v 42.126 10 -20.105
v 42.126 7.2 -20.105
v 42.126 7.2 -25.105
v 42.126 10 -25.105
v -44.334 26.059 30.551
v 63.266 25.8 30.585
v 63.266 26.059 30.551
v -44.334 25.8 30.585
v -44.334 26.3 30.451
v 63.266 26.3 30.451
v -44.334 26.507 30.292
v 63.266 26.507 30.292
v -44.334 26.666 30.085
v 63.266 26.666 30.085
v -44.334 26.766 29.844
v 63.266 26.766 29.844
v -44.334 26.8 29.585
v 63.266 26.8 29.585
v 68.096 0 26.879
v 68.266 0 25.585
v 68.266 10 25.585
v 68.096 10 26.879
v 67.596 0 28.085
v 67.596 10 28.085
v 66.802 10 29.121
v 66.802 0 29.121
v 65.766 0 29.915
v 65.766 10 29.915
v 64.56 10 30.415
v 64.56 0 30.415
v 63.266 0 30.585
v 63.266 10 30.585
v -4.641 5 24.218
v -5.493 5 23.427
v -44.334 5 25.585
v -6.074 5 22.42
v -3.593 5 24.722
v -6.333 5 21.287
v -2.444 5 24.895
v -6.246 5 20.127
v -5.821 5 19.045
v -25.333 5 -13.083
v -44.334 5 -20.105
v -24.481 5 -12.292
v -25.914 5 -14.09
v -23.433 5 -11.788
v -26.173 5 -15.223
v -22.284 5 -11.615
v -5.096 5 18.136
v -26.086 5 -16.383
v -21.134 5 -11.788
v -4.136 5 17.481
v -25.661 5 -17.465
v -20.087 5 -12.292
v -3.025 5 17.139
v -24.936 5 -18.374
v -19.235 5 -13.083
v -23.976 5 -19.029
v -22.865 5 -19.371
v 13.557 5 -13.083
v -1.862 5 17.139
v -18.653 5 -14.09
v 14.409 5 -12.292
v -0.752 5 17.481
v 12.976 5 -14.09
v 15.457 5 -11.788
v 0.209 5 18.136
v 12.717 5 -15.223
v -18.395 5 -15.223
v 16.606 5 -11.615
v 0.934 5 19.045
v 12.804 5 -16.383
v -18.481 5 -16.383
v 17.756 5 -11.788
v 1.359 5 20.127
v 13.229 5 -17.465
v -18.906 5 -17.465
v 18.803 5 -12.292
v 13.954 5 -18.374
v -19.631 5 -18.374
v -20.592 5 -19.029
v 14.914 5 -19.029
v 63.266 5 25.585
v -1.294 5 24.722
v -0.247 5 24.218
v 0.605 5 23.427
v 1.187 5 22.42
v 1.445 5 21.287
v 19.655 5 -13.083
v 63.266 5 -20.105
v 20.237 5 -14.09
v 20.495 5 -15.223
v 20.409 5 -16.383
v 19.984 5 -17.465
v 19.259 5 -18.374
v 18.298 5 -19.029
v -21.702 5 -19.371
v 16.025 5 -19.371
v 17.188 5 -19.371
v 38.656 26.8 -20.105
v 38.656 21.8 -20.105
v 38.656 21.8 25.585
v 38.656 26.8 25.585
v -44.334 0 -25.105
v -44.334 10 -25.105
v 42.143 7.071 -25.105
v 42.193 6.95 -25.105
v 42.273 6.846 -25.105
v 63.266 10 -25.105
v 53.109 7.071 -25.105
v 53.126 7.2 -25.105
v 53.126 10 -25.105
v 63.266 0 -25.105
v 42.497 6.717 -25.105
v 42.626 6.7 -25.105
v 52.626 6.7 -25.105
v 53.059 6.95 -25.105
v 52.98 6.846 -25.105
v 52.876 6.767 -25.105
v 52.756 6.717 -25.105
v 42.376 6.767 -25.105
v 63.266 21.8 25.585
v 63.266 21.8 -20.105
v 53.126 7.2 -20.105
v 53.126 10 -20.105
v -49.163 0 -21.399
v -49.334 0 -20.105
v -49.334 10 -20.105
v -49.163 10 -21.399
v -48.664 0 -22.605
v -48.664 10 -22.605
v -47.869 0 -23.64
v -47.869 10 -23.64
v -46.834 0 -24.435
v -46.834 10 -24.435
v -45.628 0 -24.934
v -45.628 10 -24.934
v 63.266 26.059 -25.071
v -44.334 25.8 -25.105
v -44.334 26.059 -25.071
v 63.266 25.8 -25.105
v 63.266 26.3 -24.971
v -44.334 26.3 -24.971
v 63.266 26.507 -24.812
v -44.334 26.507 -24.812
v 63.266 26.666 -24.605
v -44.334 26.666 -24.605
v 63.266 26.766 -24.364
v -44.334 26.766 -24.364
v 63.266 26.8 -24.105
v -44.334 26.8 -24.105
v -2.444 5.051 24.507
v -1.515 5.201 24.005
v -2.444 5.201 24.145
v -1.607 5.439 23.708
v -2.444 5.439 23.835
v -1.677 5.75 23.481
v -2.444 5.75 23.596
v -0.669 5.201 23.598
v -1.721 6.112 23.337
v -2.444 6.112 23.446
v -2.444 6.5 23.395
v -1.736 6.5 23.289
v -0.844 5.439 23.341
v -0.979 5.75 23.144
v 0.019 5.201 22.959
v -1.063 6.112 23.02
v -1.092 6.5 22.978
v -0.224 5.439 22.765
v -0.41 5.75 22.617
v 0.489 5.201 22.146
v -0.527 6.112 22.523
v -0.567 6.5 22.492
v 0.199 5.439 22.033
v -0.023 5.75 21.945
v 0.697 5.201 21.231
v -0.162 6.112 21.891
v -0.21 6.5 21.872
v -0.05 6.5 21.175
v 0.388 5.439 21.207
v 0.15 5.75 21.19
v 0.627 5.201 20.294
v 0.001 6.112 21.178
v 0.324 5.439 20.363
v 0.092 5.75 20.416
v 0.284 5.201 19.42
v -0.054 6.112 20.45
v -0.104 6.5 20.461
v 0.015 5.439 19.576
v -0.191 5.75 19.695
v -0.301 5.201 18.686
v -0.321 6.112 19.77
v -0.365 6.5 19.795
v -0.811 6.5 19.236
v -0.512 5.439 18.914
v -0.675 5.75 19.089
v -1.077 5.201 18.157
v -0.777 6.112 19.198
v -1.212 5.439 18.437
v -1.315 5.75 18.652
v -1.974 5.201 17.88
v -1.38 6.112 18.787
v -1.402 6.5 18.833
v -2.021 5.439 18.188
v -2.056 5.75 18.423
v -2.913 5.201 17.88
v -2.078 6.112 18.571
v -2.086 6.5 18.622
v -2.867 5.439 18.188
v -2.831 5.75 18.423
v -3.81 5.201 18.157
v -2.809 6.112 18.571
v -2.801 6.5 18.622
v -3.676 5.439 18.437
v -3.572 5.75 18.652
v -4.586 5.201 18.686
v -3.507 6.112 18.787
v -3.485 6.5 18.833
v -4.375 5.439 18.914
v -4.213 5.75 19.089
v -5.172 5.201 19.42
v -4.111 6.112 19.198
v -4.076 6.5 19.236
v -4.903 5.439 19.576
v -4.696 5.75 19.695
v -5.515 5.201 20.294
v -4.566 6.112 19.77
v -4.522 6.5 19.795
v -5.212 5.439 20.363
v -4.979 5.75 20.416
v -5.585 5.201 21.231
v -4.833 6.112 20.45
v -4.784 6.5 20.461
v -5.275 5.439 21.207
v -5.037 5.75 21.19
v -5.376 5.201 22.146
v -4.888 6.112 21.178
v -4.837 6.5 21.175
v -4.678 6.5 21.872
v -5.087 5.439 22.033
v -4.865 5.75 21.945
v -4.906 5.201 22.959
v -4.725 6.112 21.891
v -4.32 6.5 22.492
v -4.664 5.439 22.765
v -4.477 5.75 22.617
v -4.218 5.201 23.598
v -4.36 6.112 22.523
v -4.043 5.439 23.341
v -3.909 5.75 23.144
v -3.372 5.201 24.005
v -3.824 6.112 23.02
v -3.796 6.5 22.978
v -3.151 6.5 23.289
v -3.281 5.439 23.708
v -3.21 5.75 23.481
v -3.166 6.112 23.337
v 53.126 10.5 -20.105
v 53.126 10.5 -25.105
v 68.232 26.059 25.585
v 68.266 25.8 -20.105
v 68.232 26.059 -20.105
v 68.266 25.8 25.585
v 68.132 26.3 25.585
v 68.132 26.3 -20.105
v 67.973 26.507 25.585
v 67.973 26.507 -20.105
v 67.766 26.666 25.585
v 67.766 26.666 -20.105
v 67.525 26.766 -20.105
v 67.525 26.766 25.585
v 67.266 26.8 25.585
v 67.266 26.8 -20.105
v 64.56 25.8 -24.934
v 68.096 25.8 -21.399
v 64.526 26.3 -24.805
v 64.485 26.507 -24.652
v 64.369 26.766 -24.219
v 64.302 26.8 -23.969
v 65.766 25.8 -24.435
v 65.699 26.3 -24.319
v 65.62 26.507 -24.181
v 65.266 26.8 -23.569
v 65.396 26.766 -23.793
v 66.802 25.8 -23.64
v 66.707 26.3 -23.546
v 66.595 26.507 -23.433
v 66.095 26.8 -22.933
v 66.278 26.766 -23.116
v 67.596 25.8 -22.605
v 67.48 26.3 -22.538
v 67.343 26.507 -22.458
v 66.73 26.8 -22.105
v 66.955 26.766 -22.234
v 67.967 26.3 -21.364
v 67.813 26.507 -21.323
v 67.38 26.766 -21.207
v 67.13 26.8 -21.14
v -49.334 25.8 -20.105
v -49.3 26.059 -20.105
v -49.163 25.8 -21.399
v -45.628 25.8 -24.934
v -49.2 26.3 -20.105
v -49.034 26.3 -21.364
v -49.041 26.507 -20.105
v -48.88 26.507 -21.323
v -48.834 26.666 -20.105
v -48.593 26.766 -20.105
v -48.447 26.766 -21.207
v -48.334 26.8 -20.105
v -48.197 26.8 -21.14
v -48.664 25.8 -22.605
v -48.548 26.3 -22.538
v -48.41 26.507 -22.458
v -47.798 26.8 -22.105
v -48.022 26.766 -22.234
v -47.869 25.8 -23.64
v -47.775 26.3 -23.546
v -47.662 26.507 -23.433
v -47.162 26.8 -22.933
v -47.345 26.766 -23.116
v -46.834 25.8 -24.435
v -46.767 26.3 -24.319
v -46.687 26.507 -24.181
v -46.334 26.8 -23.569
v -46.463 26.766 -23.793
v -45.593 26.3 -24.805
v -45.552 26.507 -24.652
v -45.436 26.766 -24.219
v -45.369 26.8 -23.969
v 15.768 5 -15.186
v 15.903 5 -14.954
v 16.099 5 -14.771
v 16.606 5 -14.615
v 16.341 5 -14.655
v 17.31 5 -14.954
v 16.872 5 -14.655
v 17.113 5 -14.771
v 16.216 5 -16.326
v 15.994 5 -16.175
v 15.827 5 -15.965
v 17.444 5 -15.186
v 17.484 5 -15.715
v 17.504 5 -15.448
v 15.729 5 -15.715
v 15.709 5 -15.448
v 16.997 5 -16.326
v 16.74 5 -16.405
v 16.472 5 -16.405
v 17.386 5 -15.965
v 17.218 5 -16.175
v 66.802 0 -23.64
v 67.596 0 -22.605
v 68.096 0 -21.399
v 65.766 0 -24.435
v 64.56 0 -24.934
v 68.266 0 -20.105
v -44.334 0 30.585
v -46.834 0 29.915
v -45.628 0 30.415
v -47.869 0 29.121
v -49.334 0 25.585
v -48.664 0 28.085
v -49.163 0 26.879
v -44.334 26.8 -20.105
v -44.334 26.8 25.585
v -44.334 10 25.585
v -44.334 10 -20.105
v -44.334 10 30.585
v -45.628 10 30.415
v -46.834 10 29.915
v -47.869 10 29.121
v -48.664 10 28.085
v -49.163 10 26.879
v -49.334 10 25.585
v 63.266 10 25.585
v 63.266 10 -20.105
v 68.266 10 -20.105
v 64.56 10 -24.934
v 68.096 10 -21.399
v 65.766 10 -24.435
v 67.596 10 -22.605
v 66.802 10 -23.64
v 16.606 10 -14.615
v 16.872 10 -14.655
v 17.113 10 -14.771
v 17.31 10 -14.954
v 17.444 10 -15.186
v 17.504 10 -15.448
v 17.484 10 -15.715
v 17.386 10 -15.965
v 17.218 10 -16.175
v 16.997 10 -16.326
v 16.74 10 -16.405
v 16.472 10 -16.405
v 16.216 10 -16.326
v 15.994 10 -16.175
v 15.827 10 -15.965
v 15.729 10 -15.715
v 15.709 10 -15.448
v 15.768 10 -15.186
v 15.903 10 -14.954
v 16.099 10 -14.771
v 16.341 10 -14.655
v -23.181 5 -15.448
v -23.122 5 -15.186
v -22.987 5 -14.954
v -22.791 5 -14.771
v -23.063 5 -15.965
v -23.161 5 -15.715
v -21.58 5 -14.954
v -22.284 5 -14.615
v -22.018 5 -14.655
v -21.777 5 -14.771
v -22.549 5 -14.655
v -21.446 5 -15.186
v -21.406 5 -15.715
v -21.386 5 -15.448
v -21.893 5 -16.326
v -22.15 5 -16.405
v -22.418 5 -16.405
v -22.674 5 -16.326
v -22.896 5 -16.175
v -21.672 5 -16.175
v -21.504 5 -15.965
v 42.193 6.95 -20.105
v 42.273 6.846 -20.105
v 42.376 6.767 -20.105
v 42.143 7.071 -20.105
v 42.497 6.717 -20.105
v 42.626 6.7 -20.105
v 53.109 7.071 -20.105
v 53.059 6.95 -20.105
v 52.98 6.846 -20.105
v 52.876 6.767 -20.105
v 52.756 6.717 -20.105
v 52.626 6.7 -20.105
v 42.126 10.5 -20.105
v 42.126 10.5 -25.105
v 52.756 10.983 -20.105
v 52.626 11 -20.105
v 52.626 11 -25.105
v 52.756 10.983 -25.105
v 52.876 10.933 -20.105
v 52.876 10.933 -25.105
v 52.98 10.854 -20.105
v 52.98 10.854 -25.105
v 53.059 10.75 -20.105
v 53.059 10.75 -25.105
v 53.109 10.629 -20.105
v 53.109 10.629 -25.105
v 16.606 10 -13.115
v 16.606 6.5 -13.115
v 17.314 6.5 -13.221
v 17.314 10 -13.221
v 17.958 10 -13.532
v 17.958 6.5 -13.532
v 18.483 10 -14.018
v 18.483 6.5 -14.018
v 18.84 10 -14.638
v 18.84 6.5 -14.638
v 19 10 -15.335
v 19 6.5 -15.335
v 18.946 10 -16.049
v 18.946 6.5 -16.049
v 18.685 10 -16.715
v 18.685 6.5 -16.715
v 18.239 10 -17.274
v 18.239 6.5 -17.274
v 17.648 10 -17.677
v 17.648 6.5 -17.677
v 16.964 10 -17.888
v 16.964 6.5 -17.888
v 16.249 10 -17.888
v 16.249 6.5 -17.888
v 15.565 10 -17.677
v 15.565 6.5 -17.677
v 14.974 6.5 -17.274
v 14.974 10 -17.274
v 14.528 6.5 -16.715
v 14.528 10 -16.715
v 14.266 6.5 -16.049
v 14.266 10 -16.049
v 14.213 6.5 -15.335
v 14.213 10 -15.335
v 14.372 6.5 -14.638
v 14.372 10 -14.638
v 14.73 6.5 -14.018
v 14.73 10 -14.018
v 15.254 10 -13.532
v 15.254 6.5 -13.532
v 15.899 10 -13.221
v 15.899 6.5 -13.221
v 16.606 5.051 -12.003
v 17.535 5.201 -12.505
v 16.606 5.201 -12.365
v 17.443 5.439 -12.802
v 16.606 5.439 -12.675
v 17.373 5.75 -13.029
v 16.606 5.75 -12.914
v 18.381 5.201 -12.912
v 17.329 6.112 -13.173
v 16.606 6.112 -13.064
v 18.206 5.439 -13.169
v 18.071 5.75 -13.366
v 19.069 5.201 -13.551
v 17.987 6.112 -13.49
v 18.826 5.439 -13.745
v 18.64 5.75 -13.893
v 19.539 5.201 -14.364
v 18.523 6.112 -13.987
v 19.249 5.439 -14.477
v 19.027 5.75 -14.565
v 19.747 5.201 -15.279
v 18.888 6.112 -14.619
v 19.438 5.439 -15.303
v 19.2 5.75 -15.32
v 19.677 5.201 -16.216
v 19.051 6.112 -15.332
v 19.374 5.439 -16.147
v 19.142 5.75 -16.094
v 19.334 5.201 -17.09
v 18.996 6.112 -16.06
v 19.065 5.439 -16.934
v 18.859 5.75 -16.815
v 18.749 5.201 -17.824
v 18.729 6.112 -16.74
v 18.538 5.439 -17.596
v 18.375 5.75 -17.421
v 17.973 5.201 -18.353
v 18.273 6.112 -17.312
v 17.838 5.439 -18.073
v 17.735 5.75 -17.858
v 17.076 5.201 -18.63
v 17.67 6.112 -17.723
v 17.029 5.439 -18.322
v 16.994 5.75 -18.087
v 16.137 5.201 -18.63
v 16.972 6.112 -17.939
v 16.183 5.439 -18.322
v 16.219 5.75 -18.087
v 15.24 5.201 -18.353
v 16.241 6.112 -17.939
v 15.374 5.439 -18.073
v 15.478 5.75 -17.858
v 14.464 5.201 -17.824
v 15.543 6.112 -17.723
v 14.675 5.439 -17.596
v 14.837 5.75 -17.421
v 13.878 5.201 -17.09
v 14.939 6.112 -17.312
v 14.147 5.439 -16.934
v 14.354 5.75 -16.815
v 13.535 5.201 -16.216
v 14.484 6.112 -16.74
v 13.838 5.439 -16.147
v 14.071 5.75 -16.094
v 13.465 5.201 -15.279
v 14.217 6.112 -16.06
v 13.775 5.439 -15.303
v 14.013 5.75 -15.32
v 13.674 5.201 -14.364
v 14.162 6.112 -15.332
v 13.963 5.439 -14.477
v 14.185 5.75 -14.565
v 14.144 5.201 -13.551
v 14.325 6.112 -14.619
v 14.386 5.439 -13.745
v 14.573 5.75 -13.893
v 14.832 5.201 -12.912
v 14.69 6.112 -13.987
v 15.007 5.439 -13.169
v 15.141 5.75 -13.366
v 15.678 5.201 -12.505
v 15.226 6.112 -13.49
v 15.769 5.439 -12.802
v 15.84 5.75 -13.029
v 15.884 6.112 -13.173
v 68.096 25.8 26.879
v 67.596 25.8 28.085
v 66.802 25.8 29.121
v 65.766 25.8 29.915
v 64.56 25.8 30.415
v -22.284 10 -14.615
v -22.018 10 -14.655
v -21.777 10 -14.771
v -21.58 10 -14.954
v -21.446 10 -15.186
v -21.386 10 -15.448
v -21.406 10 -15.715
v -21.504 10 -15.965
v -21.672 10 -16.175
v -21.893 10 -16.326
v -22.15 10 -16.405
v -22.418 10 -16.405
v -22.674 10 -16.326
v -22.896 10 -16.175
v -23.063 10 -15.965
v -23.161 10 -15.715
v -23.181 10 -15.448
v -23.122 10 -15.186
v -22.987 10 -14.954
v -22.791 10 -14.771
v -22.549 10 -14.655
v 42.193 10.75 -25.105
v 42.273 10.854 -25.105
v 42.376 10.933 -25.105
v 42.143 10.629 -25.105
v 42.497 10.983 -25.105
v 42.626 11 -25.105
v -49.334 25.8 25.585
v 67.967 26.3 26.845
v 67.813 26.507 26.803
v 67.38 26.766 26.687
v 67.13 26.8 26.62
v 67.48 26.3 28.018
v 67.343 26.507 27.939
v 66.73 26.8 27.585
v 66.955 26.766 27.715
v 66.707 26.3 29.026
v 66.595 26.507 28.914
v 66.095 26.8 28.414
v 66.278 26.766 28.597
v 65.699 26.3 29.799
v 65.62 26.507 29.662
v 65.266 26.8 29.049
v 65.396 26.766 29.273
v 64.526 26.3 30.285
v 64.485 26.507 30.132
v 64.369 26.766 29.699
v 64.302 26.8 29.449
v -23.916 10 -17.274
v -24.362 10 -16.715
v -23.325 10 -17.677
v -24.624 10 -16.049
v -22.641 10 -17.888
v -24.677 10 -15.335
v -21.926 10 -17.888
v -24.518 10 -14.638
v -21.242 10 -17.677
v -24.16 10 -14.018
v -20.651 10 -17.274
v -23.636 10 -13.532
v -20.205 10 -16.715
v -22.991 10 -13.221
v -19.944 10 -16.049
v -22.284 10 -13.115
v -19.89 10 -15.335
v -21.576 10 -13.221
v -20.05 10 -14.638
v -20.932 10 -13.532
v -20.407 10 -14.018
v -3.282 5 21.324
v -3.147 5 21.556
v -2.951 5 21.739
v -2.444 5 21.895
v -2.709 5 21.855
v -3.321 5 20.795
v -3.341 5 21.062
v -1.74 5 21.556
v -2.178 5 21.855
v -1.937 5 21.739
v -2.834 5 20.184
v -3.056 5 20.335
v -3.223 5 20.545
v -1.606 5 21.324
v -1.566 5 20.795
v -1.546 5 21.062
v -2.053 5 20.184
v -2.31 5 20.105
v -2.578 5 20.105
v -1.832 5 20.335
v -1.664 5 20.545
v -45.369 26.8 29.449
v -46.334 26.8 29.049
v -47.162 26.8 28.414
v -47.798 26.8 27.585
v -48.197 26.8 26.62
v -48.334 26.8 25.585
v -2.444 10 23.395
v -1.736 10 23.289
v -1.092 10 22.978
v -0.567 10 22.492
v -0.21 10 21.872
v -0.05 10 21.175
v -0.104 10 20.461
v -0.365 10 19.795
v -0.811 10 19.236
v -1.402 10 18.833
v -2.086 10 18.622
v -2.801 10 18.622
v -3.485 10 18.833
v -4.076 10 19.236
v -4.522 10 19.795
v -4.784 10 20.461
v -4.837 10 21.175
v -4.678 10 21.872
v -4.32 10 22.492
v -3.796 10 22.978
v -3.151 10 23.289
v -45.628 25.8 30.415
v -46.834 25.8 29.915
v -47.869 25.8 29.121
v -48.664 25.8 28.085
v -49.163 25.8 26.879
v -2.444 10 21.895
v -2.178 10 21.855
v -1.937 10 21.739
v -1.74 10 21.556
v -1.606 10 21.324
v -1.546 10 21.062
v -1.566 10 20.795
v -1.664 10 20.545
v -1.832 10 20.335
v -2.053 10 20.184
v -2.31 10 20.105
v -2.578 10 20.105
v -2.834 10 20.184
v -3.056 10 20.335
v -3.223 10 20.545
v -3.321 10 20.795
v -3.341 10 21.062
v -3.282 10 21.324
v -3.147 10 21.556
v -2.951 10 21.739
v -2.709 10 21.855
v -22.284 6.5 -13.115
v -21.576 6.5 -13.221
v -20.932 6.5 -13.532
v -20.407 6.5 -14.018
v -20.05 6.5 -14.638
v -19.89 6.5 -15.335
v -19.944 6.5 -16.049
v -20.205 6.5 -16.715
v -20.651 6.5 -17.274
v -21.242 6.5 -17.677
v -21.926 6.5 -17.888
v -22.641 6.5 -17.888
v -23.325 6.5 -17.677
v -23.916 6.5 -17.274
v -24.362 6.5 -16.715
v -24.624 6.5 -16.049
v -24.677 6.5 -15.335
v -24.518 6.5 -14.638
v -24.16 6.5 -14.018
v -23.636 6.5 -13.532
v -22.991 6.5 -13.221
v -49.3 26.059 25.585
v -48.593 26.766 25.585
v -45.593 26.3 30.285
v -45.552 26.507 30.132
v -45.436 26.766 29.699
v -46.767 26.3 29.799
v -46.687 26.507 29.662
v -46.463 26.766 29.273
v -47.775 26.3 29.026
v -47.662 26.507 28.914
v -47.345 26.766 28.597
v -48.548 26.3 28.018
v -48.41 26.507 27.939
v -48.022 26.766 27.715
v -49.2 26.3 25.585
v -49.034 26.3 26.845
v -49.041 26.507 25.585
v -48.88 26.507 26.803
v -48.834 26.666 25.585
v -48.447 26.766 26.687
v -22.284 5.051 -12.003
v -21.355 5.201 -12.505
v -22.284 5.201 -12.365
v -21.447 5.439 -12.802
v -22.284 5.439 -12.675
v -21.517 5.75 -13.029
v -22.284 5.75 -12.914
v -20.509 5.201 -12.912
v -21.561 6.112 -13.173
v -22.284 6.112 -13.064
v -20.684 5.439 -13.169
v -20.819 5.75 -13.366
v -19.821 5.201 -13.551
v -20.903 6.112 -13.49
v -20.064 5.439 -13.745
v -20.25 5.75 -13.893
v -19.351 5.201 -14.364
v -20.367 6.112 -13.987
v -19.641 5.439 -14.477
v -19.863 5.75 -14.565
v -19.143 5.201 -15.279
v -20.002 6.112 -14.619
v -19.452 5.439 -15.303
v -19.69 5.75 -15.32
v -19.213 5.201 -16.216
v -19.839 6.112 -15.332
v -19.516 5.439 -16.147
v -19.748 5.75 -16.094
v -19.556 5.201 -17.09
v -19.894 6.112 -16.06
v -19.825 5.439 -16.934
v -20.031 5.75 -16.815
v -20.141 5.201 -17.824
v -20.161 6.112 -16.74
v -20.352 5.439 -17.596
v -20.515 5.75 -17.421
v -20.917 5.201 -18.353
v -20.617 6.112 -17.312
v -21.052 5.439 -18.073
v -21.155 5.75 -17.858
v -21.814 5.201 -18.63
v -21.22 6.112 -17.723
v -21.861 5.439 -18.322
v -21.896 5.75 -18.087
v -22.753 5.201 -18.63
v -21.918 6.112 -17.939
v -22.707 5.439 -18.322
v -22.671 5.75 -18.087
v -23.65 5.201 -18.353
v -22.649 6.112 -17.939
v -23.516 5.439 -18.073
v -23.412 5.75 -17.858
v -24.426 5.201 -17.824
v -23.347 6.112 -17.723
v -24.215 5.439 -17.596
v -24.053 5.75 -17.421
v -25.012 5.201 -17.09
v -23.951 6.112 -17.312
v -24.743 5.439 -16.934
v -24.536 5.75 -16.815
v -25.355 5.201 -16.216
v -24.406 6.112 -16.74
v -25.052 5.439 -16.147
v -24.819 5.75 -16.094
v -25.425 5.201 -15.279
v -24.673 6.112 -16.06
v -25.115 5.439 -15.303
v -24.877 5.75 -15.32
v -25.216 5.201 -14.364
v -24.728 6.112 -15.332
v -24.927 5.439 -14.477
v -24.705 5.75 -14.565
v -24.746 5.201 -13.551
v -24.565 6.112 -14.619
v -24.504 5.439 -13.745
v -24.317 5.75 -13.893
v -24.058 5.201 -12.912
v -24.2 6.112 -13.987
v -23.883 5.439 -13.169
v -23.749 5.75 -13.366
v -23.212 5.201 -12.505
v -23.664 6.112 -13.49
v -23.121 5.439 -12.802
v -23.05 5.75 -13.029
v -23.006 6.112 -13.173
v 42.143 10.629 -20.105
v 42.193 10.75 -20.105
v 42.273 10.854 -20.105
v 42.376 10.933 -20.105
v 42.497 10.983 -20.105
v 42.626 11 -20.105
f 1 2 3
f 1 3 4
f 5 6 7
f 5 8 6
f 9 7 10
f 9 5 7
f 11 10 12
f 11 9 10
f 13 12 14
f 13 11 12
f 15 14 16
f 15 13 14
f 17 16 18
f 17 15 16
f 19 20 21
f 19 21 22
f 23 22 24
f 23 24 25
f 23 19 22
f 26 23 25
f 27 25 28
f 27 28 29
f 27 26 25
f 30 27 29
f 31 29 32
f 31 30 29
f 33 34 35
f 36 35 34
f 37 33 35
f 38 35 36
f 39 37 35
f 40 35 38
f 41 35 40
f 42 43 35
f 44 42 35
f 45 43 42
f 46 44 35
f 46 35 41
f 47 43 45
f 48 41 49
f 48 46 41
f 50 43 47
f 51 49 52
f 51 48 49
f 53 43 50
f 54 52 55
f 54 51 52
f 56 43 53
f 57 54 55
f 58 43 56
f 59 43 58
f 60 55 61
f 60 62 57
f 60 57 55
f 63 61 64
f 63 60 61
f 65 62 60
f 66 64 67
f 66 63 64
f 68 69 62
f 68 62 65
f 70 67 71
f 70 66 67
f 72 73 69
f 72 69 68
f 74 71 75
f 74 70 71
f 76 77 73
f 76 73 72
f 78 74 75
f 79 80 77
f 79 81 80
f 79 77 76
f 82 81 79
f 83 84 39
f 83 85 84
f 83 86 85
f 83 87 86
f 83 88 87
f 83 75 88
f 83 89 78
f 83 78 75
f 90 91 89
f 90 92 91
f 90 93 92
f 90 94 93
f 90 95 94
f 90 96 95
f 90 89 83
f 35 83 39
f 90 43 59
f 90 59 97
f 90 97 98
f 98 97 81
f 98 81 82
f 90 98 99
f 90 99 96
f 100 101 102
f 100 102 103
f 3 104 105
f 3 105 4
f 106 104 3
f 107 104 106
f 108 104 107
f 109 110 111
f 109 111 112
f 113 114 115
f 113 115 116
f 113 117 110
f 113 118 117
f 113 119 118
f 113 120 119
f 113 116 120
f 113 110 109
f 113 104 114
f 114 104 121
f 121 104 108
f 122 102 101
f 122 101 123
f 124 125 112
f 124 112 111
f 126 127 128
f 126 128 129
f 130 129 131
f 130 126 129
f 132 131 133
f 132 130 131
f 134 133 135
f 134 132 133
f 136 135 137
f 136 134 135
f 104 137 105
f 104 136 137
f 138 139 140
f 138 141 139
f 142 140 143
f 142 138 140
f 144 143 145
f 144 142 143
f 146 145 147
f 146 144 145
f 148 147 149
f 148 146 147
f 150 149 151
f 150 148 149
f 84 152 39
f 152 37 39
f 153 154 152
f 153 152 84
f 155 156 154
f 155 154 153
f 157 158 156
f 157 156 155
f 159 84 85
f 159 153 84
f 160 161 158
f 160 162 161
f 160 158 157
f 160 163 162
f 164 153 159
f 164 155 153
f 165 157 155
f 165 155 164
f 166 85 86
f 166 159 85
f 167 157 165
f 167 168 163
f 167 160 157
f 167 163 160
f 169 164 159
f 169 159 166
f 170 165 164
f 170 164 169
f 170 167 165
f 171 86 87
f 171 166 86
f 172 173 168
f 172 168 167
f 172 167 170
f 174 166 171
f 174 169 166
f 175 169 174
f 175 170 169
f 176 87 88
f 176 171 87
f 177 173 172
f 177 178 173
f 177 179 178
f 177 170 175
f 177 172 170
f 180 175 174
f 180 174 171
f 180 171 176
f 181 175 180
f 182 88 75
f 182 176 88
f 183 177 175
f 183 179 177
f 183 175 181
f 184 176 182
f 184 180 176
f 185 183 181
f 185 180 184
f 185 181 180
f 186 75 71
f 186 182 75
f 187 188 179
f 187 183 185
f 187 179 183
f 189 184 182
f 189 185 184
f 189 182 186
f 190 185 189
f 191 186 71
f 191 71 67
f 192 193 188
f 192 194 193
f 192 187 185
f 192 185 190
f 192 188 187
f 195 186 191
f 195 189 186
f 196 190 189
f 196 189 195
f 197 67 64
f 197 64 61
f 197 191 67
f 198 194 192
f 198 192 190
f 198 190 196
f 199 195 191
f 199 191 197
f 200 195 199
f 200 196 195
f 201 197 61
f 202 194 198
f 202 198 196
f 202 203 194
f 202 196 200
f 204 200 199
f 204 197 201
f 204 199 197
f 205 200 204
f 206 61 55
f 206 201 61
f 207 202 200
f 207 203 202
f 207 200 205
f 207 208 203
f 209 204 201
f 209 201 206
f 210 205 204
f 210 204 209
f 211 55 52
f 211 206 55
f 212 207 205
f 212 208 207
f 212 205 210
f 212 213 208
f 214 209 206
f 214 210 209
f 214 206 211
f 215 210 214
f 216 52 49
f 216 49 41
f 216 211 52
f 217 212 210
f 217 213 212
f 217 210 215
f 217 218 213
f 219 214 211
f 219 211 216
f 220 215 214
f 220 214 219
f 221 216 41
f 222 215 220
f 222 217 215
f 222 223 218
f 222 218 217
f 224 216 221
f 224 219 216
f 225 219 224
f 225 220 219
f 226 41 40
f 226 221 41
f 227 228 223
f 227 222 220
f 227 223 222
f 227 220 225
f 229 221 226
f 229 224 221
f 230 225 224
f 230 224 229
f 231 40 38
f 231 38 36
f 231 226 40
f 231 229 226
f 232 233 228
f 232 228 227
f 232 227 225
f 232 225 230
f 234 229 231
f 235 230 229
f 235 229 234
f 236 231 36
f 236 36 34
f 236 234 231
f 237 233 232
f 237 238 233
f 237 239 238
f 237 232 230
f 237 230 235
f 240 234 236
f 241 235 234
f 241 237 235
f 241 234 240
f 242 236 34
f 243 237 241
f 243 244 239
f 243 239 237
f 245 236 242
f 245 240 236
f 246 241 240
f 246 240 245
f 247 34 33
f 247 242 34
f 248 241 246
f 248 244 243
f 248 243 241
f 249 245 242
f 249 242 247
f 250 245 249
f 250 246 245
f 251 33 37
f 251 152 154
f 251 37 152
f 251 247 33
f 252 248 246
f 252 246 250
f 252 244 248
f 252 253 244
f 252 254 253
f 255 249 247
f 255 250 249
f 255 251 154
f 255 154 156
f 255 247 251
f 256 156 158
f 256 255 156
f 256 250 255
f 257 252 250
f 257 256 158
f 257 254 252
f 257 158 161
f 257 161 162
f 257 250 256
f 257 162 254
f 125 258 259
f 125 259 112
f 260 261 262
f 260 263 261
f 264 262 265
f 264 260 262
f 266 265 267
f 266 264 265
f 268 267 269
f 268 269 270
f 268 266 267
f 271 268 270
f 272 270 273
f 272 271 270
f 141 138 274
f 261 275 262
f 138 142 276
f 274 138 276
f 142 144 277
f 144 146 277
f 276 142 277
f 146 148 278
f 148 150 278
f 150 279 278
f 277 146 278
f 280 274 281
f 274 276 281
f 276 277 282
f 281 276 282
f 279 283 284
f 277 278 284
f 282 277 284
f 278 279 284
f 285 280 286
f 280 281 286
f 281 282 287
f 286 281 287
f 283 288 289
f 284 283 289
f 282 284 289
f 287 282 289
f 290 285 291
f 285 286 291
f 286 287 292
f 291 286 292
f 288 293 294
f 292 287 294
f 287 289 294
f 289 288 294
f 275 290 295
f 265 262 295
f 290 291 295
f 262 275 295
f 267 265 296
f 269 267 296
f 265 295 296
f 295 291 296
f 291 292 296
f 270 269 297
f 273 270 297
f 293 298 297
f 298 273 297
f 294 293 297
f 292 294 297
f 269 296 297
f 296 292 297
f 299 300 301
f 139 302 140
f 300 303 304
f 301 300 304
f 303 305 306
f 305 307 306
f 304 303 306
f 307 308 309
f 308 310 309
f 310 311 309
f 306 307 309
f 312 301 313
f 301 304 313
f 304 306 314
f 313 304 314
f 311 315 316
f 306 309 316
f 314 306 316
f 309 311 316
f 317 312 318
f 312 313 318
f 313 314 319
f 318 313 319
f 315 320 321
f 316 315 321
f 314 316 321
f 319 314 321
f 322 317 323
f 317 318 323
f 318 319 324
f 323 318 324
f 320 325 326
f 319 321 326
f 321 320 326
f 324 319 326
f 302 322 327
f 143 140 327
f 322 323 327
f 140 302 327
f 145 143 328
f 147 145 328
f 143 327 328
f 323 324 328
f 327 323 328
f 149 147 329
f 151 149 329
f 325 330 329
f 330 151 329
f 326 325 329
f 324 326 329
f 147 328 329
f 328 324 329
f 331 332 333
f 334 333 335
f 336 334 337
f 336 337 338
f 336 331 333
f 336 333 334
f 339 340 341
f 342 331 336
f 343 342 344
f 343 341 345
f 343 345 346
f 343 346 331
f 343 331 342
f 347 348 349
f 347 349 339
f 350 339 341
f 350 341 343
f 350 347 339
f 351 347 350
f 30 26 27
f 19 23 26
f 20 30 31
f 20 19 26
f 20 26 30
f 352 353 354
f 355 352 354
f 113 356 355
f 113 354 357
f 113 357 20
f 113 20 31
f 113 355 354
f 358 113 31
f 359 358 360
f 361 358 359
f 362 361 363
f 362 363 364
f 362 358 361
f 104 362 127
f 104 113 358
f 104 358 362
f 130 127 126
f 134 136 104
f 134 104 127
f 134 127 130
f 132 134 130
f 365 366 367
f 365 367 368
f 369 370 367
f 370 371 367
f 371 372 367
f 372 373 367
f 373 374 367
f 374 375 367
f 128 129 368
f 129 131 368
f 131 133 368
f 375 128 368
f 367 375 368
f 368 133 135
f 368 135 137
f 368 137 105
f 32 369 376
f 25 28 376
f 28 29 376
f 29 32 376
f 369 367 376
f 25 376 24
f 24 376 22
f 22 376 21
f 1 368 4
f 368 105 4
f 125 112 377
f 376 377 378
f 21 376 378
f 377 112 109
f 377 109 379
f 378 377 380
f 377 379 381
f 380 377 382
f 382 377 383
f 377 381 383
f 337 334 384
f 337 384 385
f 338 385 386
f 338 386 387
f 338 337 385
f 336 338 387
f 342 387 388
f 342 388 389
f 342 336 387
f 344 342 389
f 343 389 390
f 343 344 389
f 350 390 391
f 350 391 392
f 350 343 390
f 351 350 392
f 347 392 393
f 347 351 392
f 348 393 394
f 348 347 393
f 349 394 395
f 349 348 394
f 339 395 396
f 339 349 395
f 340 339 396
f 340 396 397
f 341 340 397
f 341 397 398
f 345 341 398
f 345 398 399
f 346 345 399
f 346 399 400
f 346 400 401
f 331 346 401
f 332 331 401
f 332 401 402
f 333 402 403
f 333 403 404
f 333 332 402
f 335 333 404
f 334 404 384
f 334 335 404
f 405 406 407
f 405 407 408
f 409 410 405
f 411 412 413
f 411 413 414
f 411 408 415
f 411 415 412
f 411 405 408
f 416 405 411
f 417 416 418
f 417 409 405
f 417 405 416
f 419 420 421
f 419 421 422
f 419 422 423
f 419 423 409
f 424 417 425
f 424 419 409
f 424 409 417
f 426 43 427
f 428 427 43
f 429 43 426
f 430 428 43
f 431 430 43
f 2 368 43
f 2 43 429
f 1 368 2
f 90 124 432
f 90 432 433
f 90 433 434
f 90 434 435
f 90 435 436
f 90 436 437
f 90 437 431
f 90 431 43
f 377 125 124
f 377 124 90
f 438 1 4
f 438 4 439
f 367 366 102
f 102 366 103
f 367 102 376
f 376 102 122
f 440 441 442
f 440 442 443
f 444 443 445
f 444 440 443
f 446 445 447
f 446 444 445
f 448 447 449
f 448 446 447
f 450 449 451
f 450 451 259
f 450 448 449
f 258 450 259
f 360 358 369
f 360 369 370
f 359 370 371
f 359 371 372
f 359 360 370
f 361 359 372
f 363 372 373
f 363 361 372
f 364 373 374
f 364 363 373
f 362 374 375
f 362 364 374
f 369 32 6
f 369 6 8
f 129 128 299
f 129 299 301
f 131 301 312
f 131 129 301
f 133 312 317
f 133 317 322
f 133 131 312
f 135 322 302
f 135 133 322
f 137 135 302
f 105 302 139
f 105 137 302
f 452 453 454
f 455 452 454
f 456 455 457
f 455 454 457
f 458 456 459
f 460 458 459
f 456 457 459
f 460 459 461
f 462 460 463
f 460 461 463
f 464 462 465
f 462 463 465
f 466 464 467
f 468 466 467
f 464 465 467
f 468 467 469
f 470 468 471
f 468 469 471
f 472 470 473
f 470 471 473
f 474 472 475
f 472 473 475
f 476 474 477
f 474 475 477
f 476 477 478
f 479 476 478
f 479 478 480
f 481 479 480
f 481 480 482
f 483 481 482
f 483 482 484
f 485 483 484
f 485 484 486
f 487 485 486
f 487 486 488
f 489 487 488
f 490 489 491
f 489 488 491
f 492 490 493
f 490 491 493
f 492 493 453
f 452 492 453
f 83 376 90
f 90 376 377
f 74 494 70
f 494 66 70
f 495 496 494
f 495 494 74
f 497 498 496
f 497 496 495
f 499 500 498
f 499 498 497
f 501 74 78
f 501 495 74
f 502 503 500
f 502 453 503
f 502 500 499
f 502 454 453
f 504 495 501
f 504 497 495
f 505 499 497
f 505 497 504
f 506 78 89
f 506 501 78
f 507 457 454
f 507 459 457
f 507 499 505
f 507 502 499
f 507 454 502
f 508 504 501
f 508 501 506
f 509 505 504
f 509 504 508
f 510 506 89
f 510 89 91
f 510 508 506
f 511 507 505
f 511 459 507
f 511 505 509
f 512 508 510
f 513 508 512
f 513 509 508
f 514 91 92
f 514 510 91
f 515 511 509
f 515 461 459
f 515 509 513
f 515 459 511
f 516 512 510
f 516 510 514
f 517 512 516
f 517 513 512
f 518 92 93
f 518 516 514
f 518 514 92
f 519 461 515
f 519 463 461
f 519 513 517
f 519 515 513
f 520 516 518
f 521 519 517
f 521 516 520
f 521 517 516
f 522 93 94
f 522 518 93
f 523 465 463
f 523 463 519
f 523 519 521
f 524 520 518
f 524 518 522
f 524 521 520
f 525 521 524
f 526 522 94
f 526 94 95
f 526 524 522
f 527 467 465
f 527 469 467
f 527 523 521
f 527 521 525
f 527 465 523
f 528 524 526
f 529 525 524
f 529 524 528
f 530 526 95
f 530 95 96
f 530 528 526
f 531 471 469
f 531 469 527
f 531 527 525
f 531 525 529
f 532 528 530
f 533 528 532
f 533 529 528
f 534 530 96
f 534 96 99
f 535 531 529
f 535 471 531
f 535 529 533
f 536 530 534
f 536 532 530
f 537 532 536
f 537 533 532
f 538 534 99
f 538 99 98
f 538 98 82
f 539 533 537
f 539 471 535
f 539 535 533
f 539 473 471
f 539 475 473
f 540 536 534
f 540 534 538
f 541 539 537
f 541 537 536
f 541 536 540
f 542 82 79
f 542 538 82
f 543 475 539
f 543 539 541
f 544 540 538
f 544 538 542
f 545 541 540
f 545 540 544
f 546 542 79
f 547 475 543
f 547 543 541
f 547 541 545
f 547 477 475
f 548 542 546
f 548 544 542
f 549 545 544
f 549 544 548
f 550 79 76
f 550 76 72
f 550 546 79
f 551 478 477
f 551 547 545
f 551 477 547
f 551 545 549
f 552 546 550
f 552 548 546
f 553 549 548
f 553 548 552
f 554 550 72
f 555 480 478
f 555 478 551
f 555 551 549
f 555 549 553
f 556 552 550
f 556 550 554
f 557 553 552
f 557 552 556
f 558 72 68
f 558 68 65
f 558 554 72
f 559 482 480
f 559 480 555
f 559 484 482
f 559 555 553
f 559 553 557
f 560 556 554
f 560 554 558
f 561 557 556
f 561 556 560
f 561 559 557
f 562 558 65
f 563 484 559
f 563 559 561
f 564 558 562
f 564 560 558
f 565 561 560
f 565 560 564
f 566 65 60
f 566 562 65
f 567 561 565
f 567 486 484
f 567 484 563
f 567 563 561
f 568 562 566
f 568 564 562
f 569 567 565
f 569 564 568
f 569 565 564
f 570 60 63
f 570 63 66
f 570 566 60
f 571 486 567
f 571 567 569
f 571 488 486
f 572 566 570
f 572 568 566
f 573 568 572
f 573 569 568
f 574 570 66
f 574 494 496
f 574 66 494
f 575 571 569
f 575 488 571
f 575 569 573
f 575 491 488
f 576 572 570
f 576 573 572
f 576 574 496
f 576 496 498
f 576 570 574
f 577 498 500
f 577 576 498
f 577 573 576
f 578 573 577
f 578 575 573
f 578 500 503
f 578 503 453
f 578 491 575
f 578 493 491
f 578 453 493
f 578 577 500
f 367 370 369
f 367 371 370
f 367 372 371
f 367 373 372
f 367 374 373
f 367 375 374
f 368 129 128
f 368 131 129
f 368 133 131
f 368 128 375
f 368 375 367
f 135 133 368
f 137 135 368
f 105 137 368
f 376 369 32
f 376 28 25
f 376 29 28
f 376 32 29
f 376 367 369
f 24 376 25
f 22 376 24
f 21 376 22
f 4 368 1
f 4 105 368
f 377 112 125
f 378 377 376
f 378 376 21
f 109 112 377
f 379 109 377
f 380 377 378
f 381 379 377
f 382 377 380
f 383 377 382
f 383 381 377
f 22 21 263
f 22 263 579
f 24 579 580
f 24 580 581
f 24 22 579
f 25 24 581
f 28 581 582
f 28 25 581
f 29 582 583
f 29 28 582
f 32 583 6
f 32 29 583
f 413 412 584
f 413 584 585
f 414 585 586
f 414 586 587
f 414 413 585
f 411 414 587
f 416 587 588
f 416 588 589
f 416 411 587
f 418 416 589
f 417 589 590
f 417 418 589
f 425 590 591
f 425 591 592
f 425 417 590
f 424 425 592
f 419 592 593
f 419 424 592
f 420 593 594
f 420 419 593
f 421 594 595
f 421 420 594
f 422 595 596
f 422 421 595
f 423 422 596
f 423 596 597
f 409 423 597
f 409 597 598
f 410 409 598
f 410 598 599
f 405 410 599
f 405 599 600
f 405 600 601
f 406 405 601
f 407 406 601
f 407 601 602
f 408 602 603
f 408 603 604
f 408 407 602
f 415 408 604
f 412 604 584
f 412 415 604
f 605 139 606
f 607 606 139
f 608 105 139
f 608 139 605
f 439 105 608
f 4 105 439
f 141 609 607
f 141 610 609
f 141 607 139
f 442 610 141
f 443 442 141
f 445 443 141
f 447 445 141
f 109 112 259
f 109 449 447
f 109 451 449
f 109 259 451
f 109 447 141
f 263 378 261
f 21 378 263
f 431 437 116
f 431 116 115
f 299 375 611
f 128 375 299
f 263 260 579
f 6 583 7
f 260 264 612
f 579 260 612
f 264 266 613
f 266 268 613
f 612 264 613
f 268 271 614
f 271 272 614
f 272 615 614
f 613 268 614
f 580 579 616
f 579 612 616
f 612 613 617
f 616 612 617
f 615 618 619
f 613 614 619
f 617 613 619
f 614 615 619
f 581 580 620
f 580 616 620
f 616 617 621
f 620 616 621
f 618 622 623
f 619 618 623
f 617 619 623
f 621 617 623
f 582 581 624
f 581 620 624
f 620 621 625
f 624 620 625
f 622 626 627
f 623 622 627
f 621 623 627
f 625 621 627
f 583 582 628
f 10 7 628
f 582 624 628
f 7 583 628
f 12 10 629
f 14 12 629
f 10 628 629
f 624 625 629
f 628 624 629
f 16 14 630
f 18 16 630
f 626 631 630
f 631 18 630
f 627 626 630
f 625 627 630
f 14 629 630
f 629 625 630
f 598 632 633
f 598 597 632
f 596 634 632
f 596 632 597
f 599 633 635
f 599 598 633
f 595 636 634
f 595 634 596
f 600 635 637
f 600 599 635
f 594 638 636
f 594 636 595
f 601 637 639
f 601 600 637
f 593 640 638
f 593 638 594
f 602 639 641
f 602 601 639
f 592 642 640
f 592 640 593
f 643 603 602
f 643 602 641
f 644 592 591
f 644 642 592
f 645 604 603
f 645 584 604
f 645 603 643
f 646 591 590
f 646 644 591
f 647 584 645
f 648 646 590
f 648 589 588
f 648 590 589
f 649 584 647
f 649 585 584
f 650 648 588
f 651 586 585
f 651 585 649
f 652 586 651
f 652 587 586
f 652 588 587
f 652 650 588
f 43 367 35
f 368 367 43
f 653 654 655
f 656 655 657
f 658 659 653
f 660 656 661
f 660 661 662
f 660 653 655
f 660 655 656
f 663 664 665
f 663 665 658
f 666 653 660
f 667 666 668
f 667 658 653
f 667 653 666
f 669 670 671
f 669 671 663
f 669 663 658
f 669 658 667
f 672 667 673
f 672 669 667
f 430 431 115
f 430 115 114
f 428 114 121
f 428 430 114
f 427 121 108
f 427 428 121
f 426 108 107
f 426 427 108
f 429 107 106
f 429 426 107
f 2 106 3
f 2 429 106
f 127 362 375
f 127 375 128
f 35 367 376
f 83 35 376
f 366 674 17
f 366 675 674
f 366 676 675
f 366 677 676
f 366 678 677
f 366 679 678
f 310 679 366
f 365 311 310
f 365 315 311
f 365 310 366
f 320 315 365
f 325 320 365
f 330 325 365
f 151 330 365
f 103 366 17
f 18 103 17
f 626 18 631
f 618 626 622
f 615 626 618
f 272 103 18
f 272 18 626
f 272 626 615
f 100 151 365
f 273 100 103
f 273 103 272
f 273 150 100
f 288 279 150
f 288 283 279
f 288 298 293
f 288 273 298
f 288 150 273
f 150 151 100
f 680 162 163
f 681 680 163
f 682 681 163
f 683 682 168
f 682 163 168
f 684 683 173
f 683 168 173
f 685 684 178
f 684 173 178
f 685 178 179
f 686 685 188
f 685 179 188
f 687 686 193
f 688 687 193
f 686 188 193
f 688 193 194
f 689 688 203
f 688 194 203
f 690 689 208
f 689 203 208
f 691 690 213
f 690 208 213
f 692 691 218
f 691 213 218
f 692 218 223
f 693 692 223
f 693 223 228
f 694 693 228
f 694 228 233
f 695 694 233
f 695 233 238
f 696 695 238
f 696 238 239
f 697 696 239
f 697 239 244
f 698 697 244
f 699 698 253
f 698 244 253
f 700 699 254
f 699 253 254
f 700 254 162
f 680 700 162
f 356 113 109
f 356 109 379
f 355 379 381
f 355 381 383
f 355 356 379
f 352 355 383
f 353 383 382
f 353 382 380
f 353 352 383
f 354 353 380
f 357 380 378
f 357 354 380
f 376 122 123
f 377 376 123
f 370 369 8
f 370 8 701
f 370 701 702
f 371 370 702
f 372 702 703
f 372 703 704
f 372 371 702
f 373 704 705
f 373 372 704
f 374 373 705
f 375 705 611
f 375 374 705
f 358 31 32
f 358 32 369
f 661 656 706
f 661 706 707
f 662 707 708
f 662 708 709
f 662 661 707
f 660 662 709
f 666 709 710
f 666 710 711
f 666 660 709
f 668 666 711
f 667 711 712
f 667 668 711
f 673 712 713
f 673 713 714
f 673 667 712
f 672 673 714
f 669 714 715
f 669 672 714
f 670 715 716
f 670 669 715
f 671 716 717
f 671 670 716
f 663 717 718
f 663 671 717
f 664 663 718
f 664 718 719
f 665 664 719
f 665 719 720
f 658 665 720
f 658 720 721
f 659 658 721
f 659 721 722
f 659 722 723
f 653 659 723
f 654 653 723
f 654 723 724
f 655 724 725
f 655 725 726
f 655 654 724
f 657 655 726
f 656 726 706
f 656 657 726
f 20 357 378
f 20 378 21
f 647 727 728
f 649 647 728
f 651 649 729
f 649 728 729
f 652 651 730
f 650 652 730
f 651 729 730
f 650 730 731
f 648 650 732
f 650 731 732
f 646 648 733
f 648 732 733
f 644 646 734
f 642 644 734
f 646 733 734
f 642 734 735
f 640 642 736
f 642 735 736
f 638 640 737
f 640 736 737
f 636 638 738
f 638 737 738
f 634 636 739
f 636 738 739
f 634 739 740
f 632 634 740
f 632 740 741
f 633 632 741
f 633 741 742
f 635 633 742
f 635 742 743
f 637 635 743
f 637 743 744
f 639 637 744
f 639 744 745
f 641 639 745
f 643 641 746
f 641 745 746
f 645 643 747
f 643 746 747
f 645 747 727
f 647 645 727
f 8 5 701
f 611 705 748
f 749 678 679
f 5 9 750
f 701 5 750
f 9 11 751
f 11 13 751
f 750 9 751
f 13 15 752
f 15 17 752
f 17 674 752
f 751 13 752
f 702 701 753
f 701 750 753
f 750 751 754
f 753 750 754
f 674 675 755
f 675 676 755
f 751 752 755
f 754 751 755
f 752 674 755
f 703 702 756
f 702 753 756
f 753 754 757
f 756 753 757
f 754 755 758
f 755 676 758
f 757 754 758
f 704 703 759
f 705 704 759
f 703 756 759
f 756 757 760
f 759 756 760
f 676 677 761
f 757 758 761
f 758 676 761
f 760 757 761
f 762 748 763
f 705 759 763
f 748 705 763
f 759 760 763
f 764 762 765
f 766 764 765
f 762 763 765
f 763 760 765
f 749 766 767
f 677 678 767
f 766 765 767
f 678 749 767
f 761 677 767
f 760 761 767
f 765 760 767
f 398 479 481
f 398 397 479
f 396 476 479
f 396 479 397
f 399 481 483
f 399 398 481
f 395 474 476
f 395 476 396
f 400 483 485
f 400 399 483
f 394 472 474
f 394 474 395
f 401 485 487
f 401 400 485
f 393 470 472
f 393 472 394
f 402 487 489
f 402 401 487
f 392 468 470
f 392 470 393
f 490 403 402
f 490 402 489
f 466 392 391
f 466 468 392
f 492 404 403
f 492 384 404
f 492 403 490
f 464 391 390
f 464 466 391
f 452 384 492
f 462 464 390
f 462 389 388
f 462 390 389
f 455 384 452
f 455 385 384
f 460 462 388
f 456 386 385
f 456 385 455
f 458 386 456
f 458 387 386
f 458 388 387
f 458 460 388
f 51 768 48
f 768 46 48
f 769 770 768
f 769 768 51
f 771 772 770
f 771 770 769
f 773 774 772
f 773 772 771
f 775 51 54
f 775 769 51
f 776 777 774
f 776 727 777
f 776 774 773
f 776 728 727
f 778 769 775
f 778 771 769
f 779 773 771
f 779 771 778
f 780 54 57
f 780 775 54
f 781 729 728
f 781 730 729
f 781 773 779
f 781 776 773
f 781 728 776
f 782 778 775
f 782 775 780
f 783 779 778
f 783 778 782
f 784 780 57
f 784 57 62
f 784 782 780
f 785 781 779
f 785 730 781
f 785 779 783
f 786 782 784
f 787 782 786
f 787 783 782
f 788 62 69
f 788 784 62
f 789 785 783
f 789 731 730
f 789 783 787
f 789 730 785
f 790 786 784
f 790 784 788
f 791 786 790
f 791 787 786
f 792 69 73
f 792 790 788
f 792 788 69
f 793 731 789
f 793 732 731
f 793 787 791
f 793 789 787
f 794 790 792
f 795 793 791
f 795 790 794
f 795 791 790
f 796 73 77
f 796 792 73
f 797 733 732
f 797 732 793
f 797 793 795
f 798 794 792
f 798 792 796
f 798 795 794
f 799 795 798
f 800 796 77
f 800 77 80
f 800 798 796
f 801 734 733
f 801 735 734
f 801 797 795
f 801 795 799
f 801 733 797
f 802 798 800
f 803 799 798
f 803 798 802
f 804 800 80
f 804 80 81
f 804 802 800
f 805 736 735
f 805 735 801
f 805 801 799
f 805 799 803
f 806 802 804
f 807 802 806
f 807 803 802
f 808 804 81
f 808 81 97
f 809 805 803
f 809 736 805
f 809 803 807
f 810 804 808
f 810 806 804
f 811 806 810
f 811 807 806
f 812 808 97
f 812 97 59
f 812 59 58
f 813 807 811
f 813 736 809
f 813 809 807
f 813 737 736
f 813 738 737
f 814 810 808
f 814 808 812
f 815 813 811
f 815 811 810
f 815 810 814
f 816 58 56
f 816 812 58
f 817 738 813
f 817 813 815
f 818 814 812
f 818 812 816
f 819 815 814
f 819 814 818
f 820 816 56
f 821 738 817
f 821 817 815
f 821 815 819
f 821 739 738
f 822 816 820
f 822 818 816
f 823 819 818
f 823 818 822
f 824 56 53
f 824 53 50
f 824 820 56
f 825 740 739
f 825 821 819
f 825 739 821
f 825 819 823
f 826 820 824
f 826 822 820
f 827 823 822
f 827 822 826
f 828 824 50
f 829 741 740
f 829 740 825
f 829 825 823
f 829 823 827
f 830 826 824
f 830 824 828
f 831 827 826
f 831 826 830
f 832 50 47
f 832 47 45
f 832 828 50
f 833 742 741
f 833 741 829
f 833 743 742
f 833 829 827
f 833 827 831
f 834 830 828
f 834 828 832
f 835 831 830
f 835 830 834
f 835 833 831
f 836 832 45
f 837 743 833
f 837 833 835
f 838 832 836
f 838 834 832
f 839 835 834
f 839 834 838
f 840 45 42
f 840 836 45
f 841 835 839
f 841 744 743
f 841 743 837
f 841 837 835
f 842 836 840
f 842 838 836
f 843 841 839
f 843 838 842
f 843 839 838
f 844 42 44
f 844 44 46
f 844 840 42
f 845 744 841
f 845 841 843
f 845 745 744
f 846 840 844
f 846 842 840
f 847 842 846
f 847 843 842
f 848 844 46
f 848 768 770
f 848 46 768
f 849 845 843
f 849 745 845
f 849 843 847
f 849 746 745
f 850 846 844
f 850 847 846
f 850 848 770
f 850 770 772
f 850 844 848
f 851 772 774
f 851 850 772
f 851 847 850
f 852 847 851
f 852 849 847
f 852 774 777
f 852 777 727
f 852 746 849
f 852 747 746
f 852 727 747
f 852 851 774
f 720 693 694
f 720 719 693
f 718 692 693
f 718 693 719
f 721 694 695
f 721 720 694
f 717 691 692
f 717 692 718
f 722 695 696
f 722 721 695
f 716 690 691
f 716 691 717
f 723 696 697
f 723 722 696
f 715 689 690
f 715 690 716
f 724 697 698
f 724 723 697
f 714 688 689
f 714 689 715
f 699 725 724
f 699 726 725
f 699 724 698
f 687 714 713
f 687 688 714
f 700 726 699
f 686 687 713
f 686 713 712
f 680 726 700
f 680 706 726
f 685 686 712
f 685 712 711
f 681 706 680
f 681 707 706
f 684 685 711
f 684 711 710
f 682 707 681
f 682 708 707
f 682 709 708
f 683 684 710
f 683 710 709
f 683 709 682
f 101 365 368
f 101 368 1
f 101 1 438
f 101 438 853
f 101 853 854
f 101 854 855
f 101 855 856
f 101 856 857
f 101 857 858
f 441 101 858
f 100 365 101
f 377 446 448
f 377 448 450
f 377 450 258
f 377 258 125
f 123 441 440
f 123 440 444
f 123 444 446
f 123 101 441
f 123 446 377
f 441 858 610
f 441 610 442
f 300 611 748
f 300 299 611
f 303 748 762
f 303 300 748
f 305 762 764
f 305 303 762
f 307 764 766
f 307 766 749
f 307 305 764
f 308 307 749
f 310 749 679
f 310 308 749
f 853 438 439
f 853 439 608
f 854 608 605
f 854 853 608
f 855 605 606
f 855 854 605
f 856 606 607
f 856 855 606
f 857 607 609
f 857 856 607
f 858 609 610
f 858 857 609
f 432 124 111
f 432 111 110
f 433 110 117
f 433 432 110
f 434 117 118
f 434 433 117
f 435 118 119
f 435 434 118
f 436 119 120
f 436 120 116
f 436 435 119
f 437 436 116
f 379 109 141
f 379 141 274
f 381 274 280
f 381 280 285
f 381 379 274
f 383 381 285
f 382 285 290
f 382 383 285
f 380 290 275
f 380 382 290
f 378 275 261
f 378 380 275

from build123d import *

# Parameters (mm, degrees)
BOSS_EXTRUDE2_DEPTH    = 26.8
SKETCH2_W              = 107.6
SKETCH2_H              = 45.69
CUT_EXTRUDE2_DEPTH     = 21.8
SKETCH3_R              = 2.4
SKETCH3_R_2            = 0.9
BOSS_EXTRUDE3_DEPTH    = 5
FILLET3_R              = 1
FILLET5_R              = 1.5
FILLET6_R              = 1.5
FILLET7_R              = 1.5
BOSS_EXTRUDE4_REACH    = 91.152
SKETCH10_W             = 24.61
SKETCH10_H             = 5
CUT_EXTRUDE3_DEPTH     = 5
SPLIT1_SURFACE_1_BACK  = 133.851
SPLIT1_SURFACE_1_DEPTH = 267.702
SPLIT1_SURFACE_2_BACK  = 133.851
SPLIT1_SURFACE_2_DEPTH = 267.702


with BuildPart() as part:
    # Sketch1 → Boss-Extrude2 (new body)
    with BuildSketch(Plane(origin=(0, 0, 0), x_dir=(1, 0, 0), z_dir=(0, 1, 0))):
        with BuildLine():
            Line((-44.333718436, 25.104825802), (63.266281564, 25.104825802))
            ThreePointArc((63.266281564, 25.104825802), (66.80181547, 23.640359708), (68.266281564, 20.104825802))
            Line((68.266281564, 20.104825802), (68.266281564, -25.585174198))
            ThreePointArc((68.266281564, -25.585174198), (66.80181547, -29.120708104), (63.266281564, -30.585174198))
            Line((63.266281564, -30.585174198), (-44.333718436, -30.585174198))
            ThreePointArc((-44.333718436, -30.585174198), (-47.869252342, -29.120708104), (-49.333718436, -25.585174198))
            Line((-49.333718436, -25.585174198), (-49.333718436, 20.104825802))
            ThreePointArc((-49.333718436, 20.104825802), (-47.869252342, 23.640359708), (-44.333718436, 25.104825802))
        make_face()
    extrude(amount=BOSS_EXTRUDE2_DEPTH)

    # Sketch2 → Cut-Extrude2 (cut)
    with BuildSketch(Plane(origin=(0, 26.8, 0), x_dir=(1, 0, 0), z_dir=(0, 1, 0))):
        with Locations((9.466281564, -2.740174198)):
            Rectangle(SKETCH2_W, SKETCH2_H)
    extrude(amount=-CUT_EXTRUDE2_DEPTH, mode=Mode.SUBTRACT)

    # Sketch3 → Boss-Extrude3 (add)
    # profile 1 of 3: a face of its own
    with BuildSketch(Plane(origin=(0, 5, 0), x_dir=(1, 0, 0), z_dir=(0, 1, 0))):
        with Locations(Location((-22.283718436, 15.514825802, 0), (0, 0, 270))):
            Circle(SKETCH3_R)
        with Locations(Location((-22.283718436, 15.514825802, 0), (0, 0, 270))):
            Circle(SKETCH3_R_2, mode=Mode.SUBTRACT)
    # profile 2 of 3: a face of its own
    with BuildSketch(Plane(origin=(0, 5, 0), x_dir=(1, 0, 0), z_dir=(0, 1, 0))):
        with Locations(Location((16.606281564, 15.514825802, 0), (0, 0, 270))):
            Circle(SKETCH3_R)
        with Locations(Location((16.606281564, 15.514825802, 0), (0, 0, 270))):
            Circle(SKETCH3_R_2, mode=Mode.SUBTRACT)
    # profile 3 of 3: a face of its own
    with BuildSketch(Plane(origin=(0, 5, 0), x_dir=(1, 0, 0), z_dir=(0, 1, 0))):
        with Locations(Location((-2.443718436, -20.995174198, 0), (0, 0, 270))):
            Circle(SKETCH3_R)
        with Locations(Location((-2.443718436, -20.995174198, 0), (0, 0, 270))):
            Circle(SKETCH3_R_2, mode=Mode.SUBTRACT)
    extrude(amount=BOSS_EXTRUDE3_DEPTH)

    # Fillet3
    fillet3_edges = [part.edges().sort_by_distance(p)[0] for p in [
        (66.80181547, 26.8, -23.640359708),
        (68.266281564, 26.8, 2.740174198),
        (66.80181547, 26.8, 29.120708104),
        (9.466281564, 26.8, 30.585174198),
        (-47.869252342, 26.8, 29.120708104),
        (-49.333718436, 26.8, 2.740174198),
        (-47.869252342, 26.8, -23.640359708),
        (9.466281564, 26.8, -25.104825802),
    ]]
    fillet(fillet3_edges, radius=FILLET3_R)

    # Fillet5
    fillet5_edges = [part.edges().sort_by_distance(p)[0] for p in [
        (16.606281564, 5, -17.914825802),
    ]]
    fillet(fillet5_edges, radius=FILLET5_R)

    # Fillet6
    fillet6_edges = [part.edges().sort_by_distance(p)[0] for p in [
        (-22.283718436, 5, -17.914825802),
    ]]
    fillet(fillet6_edges, radius=FILLET6_R)

    # Fillet7
    fillet7_edges = [part.edges().sort_by_distance(p)[0] for p in [
        (-2.443718436, 5, 18.595174198),
    ]]
    fillet(fillet7_edges, radius=FILLET7_R)

    # Sketch10 → Boss-Extrude4 (add, up to next)
    with BuildSketch(Plane.XY.offset(-20.104825802), mode=Mode.PRIVATE) as boss_extrude4_sk1:
        with Locations((50.961281564, 24.3)):
            Rectangle(SKETCH10_W, SKETCH10_H)
    boss_extrude4_tool1 = extrude(boss_extrude4_sk1.sketch, amount=BOSS_EXTRUDE4_REACH, mode=Mode.PRIVATE) - part.part
    add(boss_extrude4_tool1.solids().sort_by_distance((50.961282, 24.3, -20.104826))[0])

    # Sketch13 → Cut-Extrude3 (cut)
    with BuildSketch(Plane.XY.offset(-20.104825802)):
        with BuildLine():
            Line((42.626281564, 11), (52.626281564, 11))
            ThreePointArc((52.626281564, 11), (52.979834955, 10.853553391), (53.126281564, 10.5))
            Line((53.126281564, 10.5), (53.126281564, 7.2))
            ThreePointArc((53.126281564, 7.2), (52.979834955, 6.846446609), (52.626281564, 6.7))
            Line((52.626281564, 6.7), (42.626281564, 6.7))
            ThreePointArc((42.626281564, 6.7), (42.272728174, 6.846446609), (42.126281564, 7.2))
            Line((42.126281564, 7.2), (42.126281564, 10.5))
            ThreePointArc((42.126281564, 10.5), (42.272728174, 10.853553391), (42.626281564, 11))
        make_face()
    extrude(amount=-CUT_EXTRUDE3_DEPTH, mode=Mode.SUBTRACT)


with BuildPart() as body_2:
    # Split1: the piece behind the surface
    add(part.part)
    # Split1 surface: a surface, the sketch's curves swept straight by 267.702 mm
    with BuildLine(Plane.XY.offset(-20.104825802).offset(-SPLIT1_SURFACE_1_BACK), mode=Mode.PRIVATE) as split1_surface_1_path:
        Line((-49.333718436, 10), (68.266281564, 10))
    split1_surface_1 = Shell.extrude(split1_surface_1_path.wire(), (0 * SPLIT1_SURFACE_1_DEPTH, 0 * SPLIT1_SURFACE_1_DEPTH, 1 * SPLIT1_SURFACE_1_DEPTH))
    split(bisect_by=split1_surface_1, keep=Keep.BOTTOM)


with BuildPart() as part_1:
    add(part.part)

    # Split1: split by a surface, the side it looks to stays
    # Split1 surface: a surface, the sketch's curves swept straight by 267.702 mm
    with BuildLine(Plane.XY.offset(-20.104825802).offset(-SPLIT1_SURFACE_2_BACK), mode=Mode.PRIVATE) as split1_surface_2_path:
        Line((-49.333718436, 10), (68.266281564, 10))
    split1_surface_2 = Shell.extrude(split1_surface_2_path.wire(), (0 * SPLIT1_SURFACE_2_DEPTH, 0 * SPLIT1_SURFACE_2_DEPTH, 1 * SPLIT1_SURFACE_2_DEPTH))
    split(bisect_by=split1_surface_2, keep=Keep.TOP)


solid = Compound([body_2.part, part_1.part])
